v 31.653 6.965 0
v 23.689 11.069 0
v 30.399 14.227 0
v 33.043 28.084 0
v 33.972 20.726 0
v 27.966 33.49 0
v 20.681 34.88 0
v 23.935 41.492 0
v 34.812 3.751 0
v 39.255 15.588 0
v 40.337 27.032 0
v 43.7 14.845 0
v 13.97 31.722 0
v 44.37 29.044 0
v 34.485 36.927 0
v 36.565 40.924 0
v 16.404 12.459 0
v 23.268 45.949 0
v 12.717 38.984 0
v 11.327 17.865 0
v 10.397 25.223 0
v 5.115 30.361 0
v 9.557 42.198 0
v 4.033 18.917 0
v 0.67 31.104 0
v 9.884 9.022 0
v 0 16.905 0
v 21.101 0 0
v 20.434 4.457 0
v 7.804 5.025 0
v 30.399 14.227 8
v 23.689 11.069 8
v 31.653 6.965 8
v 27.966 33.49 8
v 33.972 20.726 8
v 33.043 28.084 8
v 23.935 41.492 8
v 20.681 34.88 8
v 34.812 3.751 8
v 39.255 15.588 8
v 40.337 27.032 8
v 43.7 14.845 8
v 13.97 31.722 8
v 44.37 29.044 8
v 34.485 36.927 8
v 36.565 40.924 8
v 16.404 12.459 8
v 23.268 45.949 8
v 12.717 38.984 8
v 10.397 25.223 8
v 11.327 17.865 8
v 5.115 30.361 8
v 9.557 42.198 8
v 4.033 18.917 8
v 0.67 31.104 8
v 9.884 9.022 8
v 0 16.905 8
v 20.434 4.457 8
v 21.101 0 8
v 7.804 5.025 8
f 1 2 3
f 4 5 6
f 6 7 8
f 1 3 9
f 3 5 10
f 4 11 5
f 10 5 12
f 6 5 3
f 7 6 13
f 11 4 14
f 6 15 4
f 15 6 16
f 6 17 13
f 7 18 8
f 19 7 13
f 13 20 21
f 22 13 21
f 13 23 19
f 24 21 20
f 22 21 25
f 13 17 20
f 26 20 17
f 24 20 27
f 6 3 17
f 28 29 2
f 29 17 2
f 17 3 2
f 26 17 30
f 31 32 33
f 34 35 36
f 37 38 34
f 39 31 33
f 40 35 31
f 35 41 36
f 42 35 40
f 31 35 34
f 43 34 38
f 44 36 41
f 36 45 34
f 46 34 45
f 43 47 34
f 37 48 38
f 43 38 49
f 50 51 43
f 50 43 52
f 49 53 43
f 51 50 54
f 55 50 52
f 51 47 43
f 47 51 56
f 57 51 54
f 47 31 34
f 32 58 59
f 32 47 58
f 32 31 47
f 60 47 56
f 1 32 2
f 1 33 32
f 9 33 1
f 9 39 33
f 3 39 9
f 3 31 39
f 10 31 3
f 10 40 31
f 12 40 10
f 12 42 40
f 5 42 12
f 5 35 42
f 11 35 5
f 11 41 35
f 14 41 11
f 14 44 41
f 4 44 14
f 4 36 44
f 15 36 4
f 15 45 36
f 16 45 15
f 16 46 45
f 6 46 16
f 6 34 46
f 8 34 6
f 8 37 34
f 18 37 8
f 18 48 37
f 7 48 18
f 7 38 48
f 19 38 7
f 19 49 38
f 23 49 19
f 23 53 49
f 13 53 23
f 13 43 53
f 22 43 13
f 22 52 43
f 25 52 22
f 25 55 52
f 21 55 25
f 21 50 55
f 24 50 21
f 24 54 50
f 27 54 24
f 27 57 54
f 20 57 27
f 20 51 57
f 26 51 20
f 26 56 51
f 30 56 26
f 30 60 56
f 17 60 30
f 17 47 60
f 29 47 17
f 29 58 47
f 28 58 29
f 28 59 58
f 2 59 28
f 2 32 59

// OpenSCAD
$fn = 32;

// ----------------------------------------------------------------------
// Fan rotor section: 10 blades, 12 mm hub radius, 11 mm blades
// ----------------------------------------------------------------------

// --- parameters (mm) ---
profile_height = 8;       // extrusion height
profile_points = 30;      // points of the closed outline

profile = [[33.972, 20.726], [40.337, 27.032], [44.37, 29.044], [33.043, 28.084], [34.485, 36.927], [36.565, 40.924], [27.966, 33.49], [23.935, 41.492], [23.268, 45.949], [20.681, 34.88], [12.717, 38.984], [9.557, 42.198], [13.97, 31.722], [5.115, 30.361], [0.67, 31.104], [10.397, 25.223], [4.033, 18.917], [0, 16.905], [11.327, 17.865], [9.884, 9.022], [7.804, 5.025], [16.404, 12.459], [20.434, 4.457], [21.101, 0], [23.689, 11.069], [31.653, 6.965], [34.812, 3.751], [30.399, 14.227], [39.255, 15.588], [43.7, 14.845]];  // single closed polygon, 30 points, counter clockwise

// --- the one profile operation ---
linear_extrude(height = profile_height) polygon(points = profile);
